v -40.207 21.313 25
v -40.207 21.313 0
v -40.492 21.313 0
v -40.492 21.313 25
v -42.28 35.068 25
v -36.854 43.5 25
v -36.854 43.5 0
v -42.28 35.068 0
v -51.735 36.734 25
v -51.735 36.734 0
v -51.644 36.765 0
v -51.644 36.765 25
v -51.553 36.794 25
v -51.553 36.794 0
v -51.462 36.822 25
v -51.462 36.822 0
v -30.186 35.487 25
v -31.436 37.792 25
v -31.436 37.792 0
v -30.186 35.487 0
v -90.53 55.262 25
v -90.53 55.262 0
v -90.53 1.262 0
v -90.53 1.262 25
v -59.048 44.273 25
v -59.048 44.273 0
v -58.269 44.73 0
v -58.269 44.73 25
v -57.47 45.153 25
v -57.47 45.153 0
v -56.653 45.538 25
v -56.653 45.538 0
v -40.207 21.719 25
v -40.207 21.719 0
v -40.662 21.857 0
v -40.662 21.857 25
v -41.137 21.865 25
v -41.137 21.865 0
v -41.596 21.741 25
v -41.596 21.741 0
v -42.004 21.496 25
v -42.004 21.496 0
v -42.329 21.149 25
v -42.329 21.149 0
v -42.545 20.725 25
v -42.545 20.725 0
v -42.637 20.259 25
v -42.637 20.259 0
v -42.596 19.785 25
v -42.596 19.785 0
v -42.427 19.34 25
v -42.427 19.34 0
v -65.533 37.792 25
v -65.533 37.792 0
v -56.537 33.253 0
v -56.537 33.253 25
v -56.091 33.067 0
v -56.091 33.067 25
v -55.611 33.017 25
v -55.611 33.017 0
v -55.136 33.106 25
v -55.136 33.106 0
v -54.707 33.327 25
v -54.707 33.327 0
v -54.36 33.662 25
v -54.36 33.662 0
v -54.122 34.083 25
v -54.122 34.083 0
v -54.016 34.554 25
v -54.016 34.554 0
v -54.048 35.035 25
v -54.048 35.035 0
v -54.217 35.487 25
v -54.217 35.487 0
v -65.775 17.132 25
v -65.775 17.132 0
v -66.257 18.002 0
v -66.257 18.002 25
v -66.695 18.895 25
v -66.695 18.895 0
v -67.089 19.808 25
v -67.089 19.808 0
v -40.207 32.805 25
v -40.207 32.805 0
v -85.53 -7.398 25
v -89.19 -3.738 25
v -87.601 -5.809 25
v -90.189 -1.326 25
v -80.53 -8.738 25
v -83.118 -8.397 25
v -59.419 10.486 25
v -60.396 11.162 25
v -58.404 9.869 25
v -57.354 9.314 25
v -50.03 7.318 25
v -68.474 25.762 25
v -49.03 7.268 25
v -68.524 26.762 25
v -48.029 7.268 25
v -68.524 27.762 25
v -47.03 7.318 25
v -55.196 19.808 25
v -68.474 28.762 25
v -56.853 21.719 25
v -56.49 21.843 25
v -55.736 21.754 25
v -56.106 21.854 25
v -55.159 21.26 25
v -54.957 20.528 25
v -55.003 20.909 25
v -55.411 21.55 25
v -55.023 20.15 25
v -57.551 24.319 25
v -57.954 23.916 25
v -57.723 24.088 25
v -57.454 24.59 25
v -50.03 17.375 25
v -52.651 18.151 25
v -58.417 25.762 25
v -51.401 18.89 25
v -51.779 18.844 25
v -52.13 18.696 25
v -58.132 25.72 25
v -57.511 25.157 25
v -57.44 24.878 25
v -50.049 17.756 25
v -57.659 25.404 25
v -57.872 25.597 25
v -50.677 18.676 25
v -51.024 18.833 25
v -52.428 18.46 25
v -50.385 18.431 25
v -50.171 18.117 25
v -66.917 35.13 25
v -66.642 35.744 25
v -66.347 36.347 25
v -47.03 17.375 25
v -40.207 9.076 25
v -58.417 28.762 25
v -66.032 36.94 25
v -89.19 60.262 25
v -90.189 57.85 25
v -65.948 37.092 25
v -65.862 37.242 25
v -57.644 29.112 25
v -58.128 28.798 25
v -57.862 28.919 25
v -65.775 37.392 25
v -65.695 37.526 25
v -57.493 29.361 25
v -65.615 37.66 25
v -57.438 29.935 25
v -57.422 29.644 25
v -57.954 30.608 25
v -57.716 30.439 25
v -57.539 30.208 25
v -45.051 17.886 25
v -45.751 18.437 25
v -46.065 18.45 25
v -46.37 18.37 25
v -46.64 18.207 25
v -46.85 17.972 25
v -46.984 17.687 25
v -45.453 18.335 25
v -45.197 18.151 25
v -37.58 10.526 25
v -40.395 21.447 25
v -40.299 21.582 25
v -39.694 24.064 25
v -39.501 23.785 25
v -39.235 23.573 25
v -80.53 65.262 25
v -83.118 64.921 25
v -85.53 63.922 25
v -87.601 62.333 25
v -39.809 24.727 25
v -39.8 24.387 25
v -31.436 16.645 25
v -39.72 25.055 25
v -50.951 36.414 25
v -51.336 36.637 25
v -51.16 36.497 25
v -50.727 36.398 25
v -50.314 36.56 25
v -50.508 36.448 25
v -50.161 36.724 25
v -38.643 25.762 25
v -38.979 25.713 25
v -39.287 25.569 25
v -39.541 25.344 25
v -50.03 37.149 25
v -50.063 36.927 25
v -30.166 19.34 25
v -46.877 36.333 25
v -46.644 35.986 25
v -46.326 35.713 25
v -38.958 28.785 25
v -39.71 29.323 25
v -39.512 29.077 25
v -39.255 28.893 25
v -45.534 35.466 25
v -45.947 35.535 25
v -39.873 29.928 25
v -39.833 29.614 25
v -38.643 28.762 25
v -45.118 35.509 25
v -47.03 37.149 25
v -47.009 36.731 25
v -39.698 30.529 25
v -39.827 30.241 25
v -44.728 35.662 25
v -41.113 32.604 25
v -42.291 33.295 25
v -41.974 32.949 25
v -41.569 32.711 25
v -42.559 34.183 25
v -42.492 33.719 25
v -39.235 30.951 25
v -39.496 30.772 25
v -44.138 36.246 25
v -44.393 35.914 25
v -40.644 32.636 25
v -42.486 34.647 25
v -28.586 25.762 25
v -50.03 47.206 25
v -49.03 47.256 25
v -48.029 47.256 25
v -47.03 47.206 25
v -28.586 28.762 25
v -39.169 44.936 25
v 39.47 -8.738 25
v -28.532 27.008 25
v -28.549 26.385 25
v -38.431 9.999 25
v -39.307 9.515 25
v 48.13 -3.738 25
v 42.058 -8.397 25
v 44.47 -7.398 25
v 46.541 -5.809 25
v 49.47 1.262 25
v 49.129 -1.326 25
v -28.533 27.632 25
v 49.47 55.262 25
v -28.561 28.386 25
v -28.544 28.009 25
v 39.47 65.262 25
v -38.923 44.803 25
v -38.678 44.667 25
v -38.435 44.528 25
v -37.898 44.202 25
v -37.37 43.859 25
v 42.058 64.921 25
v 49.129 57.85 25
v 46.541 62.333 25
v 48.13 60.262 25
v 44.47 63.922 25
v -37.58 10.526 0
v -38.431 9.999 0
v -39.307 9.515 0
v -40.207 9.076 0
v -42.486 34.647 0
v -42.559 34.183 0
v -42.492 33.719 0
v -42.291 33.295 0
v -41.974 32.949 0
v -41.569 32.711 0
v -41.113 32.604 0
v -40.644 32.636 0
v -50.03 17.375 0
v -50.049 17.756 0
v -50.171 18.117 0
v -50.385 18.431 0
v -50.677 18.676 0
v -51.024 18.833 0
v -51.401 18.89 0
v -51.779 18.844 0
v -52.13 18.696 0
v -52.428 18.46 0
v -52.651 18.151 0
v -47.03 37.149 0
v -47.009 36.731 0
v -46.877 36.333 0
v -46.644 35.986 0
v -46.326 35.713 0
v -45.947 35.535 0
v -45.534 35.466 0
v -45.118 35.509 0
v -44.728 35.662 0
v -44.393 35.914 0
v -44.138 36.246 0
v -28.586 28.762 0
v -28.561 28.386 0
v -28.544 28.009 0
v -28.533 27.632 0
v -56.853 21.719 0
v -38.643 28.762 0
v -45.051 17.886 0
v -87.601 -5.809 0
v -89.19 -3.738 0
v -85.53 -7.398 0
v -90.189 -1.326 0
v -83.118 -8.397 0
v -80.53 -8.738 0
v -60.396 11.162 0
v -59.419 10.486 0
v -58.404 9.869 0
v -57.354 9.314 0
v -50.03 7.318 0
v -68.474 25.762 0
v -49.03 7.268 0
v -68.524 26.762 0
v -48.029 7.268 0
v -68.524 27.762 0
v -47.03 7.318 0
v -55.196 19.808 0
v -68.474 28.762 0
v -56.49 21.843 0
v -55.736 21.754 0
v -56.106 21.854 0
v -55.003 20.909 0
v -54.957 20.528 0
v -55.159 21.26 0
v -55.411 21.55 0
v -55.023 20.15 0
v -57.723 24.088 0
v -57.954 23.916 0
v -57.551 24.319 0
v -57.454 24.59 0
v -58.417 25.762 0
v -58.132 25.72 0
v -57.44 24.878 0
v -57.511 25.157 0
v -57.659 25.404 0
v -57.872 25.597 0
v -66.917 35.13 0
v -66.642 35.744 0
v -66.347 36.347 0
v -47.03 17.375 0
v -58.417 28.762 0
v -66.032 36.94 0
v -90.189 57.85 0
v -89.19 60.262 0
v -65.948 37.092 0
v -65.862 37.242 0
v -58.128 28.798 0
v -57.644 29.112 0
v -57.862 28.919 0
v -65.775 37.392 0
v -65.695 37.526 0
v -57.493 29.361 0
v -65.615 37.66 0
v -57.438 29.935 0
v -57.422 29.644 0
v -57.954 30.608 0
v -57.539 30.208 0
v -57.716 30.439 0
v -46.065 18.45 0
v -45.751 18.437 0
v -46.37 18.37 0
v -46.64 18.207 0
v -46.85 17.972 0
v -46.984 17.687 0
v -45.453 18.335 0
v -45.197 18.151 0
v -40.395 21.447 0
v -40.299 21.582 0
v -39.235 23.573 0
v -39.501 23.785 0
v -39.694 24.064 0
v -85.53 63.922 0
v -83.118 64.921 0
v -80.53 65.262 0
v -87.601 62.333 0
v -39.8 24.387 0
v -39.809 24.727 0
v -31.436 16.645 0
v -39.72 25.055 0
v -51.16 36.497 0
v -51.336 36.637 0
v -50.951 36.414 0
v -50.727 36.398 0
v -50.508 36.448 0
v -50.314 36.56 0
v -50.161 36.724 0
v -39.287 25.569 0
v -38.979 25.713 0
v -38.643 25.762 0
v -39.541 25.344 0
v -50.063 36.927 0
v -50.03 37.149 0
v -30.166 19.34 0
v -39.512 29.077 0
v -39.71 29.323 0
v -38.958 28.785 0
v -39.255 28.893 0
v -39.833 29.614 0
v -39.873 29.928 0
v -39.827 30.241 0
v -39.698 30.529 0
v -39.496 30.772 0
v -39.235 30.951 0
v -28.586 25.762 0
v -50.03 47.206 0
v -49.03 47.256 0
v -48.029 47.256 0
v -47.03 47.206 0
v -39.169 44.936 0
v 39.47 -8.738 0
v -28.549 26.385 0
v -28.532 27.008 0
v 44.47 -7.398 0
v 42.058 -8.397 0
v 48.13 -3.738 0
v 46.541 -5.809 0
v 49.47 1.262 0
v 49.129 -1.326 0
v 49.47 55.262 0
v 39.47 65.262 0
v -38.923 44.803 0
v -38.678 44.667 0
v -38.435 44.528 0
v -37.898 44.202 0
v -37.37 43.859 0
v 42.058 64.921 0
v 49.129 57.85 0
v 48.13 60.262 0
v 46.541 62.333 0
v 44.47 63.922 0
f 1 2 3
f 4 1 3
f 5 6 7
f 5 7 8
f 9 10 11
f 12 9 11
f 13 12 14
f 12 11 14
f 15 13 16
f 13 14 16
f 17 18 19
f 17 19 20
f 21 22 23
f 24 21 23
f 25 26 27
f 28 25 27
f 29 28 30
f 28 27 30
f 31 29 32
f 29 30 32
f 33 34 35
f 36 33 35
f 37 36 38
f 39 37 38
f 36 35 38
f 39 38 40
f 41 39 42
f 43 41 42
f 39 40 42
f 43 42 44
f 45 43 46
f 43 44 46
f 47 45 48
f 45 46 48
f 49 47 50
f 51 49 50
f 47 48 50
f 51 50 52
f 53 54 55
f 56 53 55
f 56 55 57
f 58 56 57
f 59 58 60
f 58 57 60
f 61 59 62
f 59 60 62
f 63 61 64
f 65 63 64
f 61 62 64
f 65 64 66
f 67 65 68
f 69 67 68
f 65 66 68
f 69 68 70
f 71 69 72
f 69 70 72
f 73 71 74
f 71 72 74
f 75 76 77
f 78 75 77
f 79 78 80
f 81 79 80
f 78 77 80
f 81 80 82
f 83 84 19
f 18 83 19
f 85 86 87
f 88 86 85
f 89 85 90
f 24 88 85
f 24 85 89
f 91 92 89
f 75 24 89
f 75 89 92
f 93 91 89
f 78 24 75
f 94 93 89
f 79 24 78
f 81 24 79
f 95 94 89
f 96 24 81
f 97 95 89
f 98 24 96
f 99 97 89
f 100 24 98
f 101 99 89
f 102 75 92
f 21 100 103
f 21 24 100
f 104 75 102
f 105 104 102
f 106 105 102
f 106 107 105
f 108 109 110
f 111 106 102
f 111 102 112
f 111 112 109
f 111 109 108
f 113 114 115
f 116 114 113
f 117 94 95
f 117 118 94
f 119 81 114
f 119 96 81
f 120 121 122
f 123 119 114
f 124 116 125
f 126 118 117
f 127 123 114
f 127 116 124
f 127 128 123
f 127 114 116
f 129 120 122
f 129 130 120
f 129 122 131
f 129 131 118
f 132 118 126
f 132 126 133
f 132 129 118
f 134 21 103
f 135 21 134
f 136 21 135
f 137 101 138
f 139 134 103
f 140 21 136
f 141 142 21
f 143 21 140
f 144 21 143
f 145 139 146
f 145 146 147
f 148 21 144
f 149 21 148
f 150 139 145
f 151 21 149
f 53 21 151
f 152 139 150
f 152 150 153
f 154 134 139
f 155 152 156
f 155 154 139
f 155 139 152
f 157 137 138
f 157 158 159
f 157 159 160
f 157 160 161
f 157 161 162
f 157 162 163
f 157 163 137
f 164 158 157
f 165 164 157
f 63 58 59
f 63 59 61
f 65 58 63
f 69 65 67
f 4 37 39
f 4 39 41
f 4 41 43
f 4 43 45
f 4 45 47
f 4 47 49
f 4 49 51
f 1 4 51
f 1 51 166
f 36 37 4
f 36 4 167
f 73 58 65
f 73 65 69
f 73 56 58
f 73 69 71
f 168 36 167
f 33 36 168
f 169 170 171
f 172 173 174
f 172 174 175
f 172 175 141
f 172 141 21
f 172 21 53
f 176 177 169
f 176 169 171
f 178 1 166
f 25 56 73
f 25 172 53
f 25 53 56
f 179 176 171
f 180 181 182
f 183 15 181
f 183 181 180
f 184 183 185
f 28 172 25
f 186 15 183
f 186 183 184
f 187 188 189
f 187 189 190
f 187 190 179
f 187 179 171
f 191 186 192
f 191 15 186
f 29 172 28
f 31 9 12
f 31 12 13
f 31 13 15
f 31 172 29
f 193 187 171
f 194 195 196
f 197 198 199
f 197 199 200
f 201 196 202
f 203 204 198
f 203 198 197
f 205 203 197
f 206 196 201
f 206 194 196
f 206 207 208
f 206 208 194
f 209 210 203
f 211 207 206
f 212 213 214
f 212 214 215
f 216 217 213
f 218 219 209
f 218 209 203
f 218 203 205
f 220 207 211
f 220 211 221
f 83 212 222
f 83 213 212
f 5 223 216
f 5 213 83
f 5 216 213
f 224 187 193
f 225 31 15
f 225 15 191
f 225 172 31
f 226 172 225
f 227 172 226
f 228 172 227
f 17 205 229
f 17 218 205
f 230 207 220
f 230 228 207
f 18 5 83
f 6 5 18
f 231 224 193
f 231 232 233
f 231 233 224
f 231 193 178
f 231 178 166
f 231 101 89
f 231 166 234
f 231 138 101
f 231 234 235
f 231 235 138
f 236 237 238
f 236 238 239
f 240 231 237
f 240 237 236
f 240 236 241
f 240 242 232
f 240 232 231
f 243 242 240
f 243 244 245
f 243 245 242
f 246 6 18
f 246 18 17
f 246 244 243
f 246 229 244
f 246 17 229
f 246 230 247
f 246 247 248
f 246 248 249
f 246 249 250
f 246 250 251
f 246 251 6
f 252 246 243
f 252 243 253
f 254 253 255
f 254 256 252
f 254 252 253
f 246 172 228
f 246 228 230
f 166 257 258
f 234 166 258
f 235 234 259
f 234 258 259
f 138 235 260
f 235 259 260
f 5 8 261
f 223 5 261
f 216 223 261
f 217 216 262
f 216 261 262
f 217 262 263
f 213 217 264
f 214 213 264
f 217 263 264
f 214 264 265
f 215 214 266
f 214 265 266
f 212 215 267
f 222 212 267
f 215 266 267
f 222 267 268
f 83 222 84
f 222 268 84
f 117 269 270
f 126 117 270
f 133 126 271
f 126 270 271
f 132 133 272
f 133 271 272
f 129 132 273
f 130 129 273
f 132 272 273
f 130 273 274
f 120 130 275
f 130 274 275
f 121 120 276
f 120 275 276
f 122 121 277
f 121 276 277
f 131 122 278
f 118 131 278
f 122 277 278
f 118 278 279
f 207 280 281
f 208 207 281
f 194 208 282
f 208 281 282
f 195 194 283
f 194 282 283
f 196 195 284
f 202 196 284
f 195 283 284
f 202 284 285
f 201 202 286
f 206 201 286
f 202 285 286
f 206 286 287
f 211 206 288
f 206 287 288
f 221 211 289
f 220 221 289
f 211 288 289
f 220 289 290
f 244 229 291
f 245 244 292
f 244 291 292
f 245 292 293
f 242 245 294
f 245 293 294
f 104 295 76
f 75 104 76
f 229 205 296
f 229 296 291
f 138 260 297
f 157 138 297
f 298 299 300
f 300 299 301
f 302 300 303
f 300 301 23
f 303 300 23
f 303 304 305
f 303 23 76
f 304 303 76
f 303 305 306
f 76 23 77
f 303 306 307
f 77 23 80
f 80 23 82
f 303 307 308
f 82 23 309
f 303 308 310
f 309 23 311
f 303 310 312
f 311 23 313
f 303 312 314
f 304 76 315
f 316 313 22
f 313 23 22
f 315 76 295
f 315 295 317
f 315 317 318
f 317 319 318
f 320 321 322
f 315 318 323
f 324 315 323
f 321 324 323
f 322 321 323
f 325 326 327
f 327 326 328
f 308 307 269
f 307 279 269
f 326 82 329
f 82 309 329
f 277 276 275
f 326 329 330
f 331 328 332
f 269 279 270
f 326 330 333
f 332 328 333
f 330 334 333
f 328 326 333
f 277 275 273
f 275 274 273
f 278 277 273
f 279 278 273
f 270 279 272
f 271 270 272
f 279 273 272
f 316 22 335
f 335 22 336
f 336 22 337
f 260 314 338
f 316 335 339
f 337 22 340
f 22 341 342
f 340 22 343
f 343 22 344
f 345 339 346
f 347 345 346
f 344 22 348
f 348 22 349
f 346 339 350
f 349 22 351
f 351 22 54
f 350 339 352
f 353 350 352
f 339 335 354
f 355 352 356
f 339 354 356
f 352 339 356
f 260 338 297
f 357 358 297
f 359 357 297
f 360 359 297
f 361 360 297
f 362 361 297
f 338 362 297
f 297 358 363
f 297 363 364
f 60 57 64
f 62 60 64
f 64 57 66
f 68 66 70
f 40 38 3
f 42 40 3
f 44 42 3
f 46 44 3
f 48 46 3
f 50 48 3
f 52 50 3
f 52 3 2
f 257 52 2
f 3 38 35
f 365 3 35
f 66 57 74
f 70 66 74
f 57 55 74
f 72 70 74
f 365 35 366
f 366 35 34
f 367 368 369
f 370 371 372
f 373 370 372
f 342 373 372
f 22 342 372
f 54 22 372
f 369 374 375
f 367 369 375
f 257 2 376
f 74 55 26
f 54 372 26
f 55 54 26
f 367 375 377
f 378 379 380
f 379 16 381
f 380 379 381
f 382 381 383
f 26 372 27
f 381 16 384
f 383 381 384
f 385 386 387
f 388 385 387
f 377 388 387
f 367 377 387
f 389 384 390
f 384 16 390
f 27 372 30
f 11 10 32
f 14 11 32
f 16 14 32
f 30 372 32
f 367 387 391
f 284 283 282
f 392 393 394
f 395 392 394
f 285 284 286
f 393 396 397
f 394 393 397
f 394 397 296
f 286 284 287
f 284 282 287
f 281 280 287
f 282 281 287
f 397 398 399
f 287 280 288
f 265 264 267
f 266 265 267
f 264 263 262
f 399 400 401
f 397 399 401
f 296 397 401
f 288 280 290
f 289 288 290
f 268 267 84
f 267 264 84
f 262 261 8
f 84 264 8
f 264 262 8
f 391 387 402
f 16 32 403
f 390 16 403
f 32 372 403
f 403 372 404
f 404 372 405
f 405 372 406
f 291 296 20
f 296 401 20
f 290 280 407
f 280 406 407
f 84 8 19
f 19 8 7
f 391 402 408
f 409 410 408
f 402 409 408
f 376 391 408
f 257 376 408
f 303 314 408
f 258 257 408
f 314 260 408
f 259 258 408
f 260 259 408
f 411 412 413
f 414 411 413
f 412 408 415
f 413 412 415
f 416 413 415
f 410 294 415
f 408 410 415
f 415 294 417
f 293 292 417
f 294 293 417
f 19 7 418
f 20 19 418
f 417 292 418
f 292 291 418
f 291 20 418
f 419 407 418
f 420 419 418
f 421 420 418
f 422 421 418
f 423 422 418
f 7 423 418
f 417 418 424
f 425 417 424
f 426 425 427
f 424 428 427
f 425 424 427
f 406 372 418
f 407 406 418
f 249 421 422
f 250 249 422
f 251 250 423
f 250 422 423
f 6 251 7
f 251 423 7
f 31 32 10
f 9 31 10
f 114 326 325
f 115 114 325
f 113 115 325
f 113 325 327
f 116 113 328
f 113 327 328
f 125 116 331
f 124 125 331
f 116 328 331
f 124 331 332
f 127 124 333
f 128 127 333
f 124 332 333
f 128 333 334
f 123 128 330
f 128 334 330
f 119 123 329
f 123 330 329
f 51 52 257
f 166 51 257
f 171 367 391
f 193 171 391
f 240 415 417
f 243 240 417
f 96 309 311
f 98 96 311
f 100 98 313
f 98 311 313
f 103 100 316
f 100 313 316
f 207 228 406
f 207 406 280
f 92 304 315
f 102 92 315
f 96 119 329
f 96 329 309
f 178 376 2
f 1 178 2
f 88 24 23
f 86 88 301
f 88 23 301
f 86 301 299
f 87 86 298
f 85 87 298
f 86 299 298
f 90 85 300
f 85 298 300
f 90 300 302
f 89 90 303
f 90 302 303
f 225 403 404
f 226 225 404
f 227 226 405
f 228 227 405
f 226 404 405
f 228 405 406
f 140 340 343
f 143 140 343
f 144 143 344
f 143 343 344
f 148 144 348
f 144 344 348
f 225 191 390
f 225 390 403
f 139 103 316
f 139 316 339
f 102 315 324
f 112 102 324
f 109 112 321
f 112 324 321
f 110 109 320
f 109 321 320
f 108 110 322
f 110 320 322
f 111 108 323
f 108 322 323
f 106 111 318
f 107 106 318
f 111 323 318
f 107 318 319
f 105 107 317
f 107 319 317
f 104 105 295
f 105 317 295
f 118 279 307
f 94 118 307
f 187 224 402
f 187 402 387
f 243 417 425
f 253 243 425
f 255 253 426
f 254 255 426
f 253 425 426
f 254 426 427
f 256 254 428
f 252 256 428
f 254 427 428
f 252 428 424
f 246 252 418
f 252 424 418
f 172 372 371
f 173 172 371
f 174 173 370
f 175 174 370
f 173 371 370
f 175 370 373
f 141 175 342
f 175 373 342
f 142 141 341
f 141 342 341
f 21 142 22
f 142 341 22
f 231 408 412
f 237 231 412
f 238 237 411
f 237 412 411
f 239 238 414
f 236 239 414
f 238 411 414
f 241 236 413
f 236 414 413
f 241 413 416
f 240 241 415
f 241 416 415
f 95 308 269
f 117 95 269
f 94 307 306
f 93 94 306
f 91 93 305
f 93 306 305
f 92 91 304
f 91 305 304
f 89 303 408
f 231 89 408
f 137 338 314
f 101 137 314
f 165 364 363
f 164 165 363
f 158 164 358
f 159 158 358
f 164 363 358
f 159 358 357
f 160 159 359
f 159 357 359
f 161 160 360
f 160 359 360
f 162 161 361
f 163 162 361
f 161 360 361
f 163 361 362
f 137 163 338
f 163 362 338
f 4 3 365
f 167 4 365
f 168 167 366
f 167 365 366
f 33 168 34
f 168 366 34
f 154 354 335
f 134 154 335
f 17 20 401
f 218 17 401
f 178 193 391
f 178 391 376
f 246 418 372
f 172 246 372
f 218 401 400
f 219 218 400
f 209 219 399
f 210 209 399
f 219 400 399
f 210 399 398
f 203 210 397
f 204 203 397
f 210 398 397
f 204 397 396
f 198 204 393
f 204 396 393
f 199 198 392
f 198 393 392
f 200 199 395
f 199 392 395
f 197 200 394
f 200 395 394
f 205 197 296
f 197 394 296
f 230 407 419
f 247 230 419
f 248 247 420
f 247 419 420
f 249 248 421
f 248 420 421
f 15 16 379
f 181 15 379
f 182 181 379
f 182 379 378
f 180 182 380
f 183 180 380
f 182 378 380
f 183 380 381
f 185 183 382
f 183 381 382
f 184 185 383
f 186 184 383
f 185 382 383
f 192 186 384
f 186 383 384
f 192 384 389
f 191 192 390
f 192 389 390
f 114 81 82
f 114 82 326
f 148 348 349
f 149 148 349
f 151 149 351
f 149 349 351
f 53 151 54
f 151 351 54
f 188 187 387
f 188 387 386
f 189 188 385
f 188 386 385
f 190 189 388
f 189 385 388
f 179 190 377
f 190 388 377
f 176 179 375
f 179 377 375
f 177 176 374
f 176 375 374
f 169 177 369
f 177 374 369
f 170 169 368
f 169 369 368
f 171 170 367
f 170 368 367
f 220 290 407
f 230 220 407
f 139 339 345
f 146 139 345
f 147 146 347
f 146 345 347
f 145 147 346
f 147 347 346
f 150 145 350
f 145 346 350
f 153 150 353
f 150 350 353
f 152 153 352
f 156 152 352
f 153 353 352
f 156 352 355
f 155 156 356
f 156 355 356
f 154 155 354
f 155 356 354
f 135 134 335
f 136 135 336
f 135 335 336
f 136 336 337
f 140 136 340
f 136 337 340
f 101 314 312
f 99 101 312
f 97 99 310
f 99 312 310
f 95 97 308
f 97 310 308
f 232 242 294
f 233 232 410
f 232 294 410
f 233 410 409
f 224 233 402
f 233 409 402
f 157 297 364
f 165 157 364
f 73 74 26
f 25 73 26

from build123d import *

# Parameters (mm, degrees)
F1_DEPTH = 25


with BuildPart() as f1:
    # F0 (on Top) → F1 (new body)
    with BuildSketch(Plane.XY):
        with BuildLine():
            ThreePointArc((-57.953546, 30.607847), (-57.446882, 29.499646), (-58.416757, 28.761975))
            ThreePointArc((-58.416757, 28.761975), (-58.529898, 27.261975), (-58.416757, 25.761975))
            ThreePointArc((-58.416757, 25.761975), (-57.465205, 25.019706), (-57.953546, 23.916103))
            ThreePointArc((-57.953546, 23.916103), (-57.47113, 22.783765), (-56.853262, 21.719268))
            ThreePointArc((-56.853262, 21.719268), (-55.274335, 21.414336), (-55.196246, 19.808131))
            ThreePointArc((-55.196246, 19.808131), (-53.98712, 18.882314), (-52.651435, 18.150832))
            ThreePointArc((-52.651435, 18.150832), (-51.023986, 18.833197), (-50.029898, 17.375115))
            ThreePointArc((-50.029898, 17.375115), (-48.529898, 17.261975), (-47.029898, 17.375115))
            ThreePointArc((-47.029898, 17.375115), (-46.370381, 18.370345), (-45.196815, 18.150832))
            Line((-45.196815, 18.150832), (-45.051432, 17.88646))
            ThreePointArc((-45.051432, 17.88646), (-43.684454, 18.514308), (-42.42712, 19.3401))
            ThreePointArc((-42.42712, 19.3401), (-42.178457, 21.333884), (-40.206533, 21.719268))
            ThreePointArc((-40.206533, 21.719268), (-39.672157, 22.620808), (-39.235069, 23.573323))
            ThreePointArc((-39.235069, 23.573323), (-39.776693, 24.894231), (-38.643038, 25.761975))
            ThreePointArc((-38.643038, 25.761975), (-38.529898, 27.261975), (-38.643038, 28.761975))
            ThreePointArc((-38.643038, 28.761975), (-39.8333, 29.614407), (-39.235069, 30.950627))
            ThreePointArc((-39.235069, 30.950627), (-39.672157, 31.903142), (-40.206533, 32.804682))
            ThreePointArc((-40.206533, 32.804682), (-42.145818, 33.109806), (-42.280061, 35.068353))
            ThreePointArc((-42.280061, 35.068353), (-43.176683, 35.708459), (-44.138275, 36.246053))
            ThreePointArc((-44.138275, 36.246053), (-45.946858, 35.535483), (-47.029898, 37.148835))
            ThreePointArc((-47.029898, 37.148835), (-48.529898, 37.261975), (-50.029898, 37.148835))
            ThreePointArc((-50.029898, 37.148835), (-50.61582, 36.41435), (-51.46214, 36.822412))
            ThreePointArc((-51.46214, 36.822412), (-51.598865, 36.779403), (-51.734959, 36.734439))
            ThreePointArc((-51.734959, 36.734439), (-52.416275, 36.475881), (-53.076951, 36.168394))
            ThreePointArc((-53.076951, 36.168394), (-53.658255, 35.846842), (-54.216927, 35.487405))
            ThreePointArc((-54.216927, 35.487405), (-54.521365, 33.482235), (-56.536531, 33.25312))
            ThreePointArc((-56.536531, 33.25312), (-57.344831, 31.98394), (-57.953546, 30.607847))
        make_face()
        Polygon((-48.936209, 27.612536), (-48.958612, 27.631866), (-48.914976, 27.631866), (-48.777016, 27.75746), (-48.560186, 27.954854), (-48.532724, 27.979855), (-48.532735, 27.904934), (-48.484508, 27.817237), (-48.317012, 27.512652), (-48.181242, 27.440397), (-48.256187, 27.402044), (-48.529898, 27.261975), (-48.946691, 27.048684), (-48.719861, 27.425874), align=None, mode=Mode.SUBTRACT)
        with BuildLine():
            Line((-31.436215, 37.792423), (-40.206533, 32.804682))
            ThreePointArc((-40.206533, 32.804682), (-39.672157, 31.903142), (-39.235069, 30.950627))
            Line((-39.235069, 30.950627), (-30.186063, 35.487405))
            Line((-30.186063, 35.487405), (-31.436215, 37.792423))
        make_face()
        with BuildLine():
            Line((39.470102, 65.261975), (-80.529898, 65.261975))
            ThreePointArc((-80.529898, 65.261975), (-87.600965, 62.333043), (-90.529898, 55.261975))
            Line((-90.529898, 55.261975), (-90.529898, 1.261975))
            ThreePointArc((-90.529898, 1.261975), (-87.600965, -5.809093), (-80.529898, -8.738025))
            Line((-80.529898, -8.738025), (39.470102, -8.738025))
            ThreePointArc((39.470102, -8.738025), (46.54117, -5.809093), (49.470102, 1.261975))
            Line((49.470102, 1.261975), (49.470102, 55.261975))
            ThreePointArc((49.470102, 55.261975), (46.54117, 62.333043), (39.470102, 65.261975))
        make_face()
        with BuildLine():
            Line((-68.473568, 28.761975), (-58.416757, 28.761975))
            ThreePointArc((-58.416757, 28.761975), (-57.446882, 29.499646), (-57.953546, 30.607847))
            Line((-57.953546, 30.607847), (-66.917042, 35.130452))
            ThreePointArc((-66.917042, 35.130452), (-66.497391, 36.046573), (-66.032131, 36.940396))
            ThreePointArc((-66.032131, 36.940396), (-65.904858, 37.167061), (-65.774651, 37.392053))
            ThreePointArc((-65.774651, 37.392053), (-65.655057, 37.592944), (-65.533122, 37.792423))
            Line((-65.533122, 37.792423), (-56.536531, 33.25312))
            ThreePointArc((-56.536531, 33.25312), (-54.521365, 33.482235), (-54.216927, 35.487405))
            Line((-54.216927, 35.487405), (-59.048139, 44.272754))
            ThreePointArc((-59.048139, 44.272754), (-57.871931, 44.946047), (-56.652824, 45.538136))
            Line((-56.652824, 45.538136), (-51.734959, 36.734439))
            ThreePointArc((-51.734959, 36.734439), (-51.598865, 36.779403), (-51.46214, 36.822412))
            ThreePointArc((-51.46214, 36.822412), (-50.61582, 36.41435), (-50.029898, 37.148835))
            Line((-50.029898, 37.148835), (-50.029898, 47.205646))
            ThreePointArc((-50.029898, 47.205646), (-48.529898, 47.261975), (-47.029898, 47.205646))
            Line((-47.029898, 47.205646), (-47.029898, 37.148835))
            ThreePointArc((-47.029898, 37.148835), (-45.946858, 35.535483), (-44.138275, 36.246053))
            Line((-44.138275, 36.246053), (-39.168957, 44.936046))
            ThreePointArc((-39.168957, 44.936046), (-38.800059, 44.735677), (-38.435449, 44.527609))
            ThreePointArc((-38.435449, 44.527609), (-37.632597, 44.03245), (-36.853985, 43.499988))
            Line((-36.853985, 43.499988), (-42.280061, 35.068353))
            ThreePointArc((-42.280061, 35.068353), (-42.145818, 33.109806), (-40.206533, 32.804682))
            Line((-40.206533, 32.804682), (-31.436215, 37.792423))
            Line((-31.436215, 37.792423), (-30.186063, 35.487405))
            Line((-30.186063, 35.487405), (-39.235069, 30.950627))
            ThreePointArc((-39.235069, 30.950627), (-39.8333, 29.614407), (-38.643038, 28.761975))
            Line((-38.643038, 28.761975), (-28.586227, 28.761975))
            ThreePointArc((-28.586227, 28.761975), (-28.55178, 28.197294), (-28.533318, 27.631866))
            ThreePointArc((-28.533318, 27.631866), (-28.537899, 26.696301), (-28.586227, 25.761975))
            Line((-28.586227, 25.761975), (-38.643038, 25.761975))
            ThreePointArc((-38.643038, 25.761975), (-39.776693, 24.894231), (-39.235069, 23.573323))
            Line((-39.235069, 23.573323), (-30.165696, 19.3401))
            Line((-30.165696, 19.3401), (-31.436215, 16.645359))
            Line((-31.436215, 16.645359), (-40.206533, 21.312802))
            Line((-40.206533, 21.312802), (-40.492028, 21.312802))
            ThreePointArc((-40.492028, 21.312802), (-40.346756, 21.514262), (-40.206533, 21.719268))
            ThreePointArc((-40.206533, 21.719268), (-42.178457, 21.333884), (-42.42712, 19.3401))
            Line((-42.42712, 19.3401), (-37.579988, 10.525802))
            ThreePointArc((-37.579988, 10.525802), (-38.866042, 9.751695), (-40.206533, 9.076222))
            Line((-40.206533, 9.076222), (-45.051432, 17.88646))
            Line((-45.051432, 17.88646), (-45.196815, 18.150832))
            ThreePointArc((-45.196815, 18.150832), (-46.370381, 18.370345), (-47.029898, 17.375115))
            Line((-47.029898, 17.375115), (-47.029898, 7.318304))
            ThreePointArc((-47.029898, 7.318304), (-48.529898, 7.261975), (-50.029898, 7.318304))
            Line((-50.029898, 7.318304), (-50.029898, 17.375115))
            ThreePointArc((-50.029898, 17.375115), (-51.023986, 18.833197), (-52.651435, 18.150832))
            Line((-52.651435, 18.150832), (-57.354282, 9.313988))
            ThreePointArc((-57.354282, 9.313988), (-58.916154, 10.170291), (-60.395644, 11.16216))
            Line((-60.395644, 11.16216), (-55.196246, 19.808131))
            ThreePointArc((-55.196246, 19.808131), (-55.274335, 21.414336), (-56.853262, 21.719268))
            Line((-56.853262, 21.719268), (-65.774651, 17.131897))
            ThreePointArc((-65.774651, 17.131897), (-66.481765, 18.445487), (-67.088998, 19.808131))
            Line((-67.088998, 19.808131), (-57.953546, 23.916103))
            ThreePointArc((-57.953546, 23.916103), (-57.465205, 25.019706), (-58.416757, 25.761975))
            Line((-58.416757, 25.761975), (-68.473568, 25.761975))
            ThreePointArc((-68.473568, 25.761975), (-68.529898, 27.261975), (-68.473568, 28.761975))
        make_face(mode=Mode.SUBTRACT)
    extrude(amount=F1_DEPTH)


solid = f1.part
